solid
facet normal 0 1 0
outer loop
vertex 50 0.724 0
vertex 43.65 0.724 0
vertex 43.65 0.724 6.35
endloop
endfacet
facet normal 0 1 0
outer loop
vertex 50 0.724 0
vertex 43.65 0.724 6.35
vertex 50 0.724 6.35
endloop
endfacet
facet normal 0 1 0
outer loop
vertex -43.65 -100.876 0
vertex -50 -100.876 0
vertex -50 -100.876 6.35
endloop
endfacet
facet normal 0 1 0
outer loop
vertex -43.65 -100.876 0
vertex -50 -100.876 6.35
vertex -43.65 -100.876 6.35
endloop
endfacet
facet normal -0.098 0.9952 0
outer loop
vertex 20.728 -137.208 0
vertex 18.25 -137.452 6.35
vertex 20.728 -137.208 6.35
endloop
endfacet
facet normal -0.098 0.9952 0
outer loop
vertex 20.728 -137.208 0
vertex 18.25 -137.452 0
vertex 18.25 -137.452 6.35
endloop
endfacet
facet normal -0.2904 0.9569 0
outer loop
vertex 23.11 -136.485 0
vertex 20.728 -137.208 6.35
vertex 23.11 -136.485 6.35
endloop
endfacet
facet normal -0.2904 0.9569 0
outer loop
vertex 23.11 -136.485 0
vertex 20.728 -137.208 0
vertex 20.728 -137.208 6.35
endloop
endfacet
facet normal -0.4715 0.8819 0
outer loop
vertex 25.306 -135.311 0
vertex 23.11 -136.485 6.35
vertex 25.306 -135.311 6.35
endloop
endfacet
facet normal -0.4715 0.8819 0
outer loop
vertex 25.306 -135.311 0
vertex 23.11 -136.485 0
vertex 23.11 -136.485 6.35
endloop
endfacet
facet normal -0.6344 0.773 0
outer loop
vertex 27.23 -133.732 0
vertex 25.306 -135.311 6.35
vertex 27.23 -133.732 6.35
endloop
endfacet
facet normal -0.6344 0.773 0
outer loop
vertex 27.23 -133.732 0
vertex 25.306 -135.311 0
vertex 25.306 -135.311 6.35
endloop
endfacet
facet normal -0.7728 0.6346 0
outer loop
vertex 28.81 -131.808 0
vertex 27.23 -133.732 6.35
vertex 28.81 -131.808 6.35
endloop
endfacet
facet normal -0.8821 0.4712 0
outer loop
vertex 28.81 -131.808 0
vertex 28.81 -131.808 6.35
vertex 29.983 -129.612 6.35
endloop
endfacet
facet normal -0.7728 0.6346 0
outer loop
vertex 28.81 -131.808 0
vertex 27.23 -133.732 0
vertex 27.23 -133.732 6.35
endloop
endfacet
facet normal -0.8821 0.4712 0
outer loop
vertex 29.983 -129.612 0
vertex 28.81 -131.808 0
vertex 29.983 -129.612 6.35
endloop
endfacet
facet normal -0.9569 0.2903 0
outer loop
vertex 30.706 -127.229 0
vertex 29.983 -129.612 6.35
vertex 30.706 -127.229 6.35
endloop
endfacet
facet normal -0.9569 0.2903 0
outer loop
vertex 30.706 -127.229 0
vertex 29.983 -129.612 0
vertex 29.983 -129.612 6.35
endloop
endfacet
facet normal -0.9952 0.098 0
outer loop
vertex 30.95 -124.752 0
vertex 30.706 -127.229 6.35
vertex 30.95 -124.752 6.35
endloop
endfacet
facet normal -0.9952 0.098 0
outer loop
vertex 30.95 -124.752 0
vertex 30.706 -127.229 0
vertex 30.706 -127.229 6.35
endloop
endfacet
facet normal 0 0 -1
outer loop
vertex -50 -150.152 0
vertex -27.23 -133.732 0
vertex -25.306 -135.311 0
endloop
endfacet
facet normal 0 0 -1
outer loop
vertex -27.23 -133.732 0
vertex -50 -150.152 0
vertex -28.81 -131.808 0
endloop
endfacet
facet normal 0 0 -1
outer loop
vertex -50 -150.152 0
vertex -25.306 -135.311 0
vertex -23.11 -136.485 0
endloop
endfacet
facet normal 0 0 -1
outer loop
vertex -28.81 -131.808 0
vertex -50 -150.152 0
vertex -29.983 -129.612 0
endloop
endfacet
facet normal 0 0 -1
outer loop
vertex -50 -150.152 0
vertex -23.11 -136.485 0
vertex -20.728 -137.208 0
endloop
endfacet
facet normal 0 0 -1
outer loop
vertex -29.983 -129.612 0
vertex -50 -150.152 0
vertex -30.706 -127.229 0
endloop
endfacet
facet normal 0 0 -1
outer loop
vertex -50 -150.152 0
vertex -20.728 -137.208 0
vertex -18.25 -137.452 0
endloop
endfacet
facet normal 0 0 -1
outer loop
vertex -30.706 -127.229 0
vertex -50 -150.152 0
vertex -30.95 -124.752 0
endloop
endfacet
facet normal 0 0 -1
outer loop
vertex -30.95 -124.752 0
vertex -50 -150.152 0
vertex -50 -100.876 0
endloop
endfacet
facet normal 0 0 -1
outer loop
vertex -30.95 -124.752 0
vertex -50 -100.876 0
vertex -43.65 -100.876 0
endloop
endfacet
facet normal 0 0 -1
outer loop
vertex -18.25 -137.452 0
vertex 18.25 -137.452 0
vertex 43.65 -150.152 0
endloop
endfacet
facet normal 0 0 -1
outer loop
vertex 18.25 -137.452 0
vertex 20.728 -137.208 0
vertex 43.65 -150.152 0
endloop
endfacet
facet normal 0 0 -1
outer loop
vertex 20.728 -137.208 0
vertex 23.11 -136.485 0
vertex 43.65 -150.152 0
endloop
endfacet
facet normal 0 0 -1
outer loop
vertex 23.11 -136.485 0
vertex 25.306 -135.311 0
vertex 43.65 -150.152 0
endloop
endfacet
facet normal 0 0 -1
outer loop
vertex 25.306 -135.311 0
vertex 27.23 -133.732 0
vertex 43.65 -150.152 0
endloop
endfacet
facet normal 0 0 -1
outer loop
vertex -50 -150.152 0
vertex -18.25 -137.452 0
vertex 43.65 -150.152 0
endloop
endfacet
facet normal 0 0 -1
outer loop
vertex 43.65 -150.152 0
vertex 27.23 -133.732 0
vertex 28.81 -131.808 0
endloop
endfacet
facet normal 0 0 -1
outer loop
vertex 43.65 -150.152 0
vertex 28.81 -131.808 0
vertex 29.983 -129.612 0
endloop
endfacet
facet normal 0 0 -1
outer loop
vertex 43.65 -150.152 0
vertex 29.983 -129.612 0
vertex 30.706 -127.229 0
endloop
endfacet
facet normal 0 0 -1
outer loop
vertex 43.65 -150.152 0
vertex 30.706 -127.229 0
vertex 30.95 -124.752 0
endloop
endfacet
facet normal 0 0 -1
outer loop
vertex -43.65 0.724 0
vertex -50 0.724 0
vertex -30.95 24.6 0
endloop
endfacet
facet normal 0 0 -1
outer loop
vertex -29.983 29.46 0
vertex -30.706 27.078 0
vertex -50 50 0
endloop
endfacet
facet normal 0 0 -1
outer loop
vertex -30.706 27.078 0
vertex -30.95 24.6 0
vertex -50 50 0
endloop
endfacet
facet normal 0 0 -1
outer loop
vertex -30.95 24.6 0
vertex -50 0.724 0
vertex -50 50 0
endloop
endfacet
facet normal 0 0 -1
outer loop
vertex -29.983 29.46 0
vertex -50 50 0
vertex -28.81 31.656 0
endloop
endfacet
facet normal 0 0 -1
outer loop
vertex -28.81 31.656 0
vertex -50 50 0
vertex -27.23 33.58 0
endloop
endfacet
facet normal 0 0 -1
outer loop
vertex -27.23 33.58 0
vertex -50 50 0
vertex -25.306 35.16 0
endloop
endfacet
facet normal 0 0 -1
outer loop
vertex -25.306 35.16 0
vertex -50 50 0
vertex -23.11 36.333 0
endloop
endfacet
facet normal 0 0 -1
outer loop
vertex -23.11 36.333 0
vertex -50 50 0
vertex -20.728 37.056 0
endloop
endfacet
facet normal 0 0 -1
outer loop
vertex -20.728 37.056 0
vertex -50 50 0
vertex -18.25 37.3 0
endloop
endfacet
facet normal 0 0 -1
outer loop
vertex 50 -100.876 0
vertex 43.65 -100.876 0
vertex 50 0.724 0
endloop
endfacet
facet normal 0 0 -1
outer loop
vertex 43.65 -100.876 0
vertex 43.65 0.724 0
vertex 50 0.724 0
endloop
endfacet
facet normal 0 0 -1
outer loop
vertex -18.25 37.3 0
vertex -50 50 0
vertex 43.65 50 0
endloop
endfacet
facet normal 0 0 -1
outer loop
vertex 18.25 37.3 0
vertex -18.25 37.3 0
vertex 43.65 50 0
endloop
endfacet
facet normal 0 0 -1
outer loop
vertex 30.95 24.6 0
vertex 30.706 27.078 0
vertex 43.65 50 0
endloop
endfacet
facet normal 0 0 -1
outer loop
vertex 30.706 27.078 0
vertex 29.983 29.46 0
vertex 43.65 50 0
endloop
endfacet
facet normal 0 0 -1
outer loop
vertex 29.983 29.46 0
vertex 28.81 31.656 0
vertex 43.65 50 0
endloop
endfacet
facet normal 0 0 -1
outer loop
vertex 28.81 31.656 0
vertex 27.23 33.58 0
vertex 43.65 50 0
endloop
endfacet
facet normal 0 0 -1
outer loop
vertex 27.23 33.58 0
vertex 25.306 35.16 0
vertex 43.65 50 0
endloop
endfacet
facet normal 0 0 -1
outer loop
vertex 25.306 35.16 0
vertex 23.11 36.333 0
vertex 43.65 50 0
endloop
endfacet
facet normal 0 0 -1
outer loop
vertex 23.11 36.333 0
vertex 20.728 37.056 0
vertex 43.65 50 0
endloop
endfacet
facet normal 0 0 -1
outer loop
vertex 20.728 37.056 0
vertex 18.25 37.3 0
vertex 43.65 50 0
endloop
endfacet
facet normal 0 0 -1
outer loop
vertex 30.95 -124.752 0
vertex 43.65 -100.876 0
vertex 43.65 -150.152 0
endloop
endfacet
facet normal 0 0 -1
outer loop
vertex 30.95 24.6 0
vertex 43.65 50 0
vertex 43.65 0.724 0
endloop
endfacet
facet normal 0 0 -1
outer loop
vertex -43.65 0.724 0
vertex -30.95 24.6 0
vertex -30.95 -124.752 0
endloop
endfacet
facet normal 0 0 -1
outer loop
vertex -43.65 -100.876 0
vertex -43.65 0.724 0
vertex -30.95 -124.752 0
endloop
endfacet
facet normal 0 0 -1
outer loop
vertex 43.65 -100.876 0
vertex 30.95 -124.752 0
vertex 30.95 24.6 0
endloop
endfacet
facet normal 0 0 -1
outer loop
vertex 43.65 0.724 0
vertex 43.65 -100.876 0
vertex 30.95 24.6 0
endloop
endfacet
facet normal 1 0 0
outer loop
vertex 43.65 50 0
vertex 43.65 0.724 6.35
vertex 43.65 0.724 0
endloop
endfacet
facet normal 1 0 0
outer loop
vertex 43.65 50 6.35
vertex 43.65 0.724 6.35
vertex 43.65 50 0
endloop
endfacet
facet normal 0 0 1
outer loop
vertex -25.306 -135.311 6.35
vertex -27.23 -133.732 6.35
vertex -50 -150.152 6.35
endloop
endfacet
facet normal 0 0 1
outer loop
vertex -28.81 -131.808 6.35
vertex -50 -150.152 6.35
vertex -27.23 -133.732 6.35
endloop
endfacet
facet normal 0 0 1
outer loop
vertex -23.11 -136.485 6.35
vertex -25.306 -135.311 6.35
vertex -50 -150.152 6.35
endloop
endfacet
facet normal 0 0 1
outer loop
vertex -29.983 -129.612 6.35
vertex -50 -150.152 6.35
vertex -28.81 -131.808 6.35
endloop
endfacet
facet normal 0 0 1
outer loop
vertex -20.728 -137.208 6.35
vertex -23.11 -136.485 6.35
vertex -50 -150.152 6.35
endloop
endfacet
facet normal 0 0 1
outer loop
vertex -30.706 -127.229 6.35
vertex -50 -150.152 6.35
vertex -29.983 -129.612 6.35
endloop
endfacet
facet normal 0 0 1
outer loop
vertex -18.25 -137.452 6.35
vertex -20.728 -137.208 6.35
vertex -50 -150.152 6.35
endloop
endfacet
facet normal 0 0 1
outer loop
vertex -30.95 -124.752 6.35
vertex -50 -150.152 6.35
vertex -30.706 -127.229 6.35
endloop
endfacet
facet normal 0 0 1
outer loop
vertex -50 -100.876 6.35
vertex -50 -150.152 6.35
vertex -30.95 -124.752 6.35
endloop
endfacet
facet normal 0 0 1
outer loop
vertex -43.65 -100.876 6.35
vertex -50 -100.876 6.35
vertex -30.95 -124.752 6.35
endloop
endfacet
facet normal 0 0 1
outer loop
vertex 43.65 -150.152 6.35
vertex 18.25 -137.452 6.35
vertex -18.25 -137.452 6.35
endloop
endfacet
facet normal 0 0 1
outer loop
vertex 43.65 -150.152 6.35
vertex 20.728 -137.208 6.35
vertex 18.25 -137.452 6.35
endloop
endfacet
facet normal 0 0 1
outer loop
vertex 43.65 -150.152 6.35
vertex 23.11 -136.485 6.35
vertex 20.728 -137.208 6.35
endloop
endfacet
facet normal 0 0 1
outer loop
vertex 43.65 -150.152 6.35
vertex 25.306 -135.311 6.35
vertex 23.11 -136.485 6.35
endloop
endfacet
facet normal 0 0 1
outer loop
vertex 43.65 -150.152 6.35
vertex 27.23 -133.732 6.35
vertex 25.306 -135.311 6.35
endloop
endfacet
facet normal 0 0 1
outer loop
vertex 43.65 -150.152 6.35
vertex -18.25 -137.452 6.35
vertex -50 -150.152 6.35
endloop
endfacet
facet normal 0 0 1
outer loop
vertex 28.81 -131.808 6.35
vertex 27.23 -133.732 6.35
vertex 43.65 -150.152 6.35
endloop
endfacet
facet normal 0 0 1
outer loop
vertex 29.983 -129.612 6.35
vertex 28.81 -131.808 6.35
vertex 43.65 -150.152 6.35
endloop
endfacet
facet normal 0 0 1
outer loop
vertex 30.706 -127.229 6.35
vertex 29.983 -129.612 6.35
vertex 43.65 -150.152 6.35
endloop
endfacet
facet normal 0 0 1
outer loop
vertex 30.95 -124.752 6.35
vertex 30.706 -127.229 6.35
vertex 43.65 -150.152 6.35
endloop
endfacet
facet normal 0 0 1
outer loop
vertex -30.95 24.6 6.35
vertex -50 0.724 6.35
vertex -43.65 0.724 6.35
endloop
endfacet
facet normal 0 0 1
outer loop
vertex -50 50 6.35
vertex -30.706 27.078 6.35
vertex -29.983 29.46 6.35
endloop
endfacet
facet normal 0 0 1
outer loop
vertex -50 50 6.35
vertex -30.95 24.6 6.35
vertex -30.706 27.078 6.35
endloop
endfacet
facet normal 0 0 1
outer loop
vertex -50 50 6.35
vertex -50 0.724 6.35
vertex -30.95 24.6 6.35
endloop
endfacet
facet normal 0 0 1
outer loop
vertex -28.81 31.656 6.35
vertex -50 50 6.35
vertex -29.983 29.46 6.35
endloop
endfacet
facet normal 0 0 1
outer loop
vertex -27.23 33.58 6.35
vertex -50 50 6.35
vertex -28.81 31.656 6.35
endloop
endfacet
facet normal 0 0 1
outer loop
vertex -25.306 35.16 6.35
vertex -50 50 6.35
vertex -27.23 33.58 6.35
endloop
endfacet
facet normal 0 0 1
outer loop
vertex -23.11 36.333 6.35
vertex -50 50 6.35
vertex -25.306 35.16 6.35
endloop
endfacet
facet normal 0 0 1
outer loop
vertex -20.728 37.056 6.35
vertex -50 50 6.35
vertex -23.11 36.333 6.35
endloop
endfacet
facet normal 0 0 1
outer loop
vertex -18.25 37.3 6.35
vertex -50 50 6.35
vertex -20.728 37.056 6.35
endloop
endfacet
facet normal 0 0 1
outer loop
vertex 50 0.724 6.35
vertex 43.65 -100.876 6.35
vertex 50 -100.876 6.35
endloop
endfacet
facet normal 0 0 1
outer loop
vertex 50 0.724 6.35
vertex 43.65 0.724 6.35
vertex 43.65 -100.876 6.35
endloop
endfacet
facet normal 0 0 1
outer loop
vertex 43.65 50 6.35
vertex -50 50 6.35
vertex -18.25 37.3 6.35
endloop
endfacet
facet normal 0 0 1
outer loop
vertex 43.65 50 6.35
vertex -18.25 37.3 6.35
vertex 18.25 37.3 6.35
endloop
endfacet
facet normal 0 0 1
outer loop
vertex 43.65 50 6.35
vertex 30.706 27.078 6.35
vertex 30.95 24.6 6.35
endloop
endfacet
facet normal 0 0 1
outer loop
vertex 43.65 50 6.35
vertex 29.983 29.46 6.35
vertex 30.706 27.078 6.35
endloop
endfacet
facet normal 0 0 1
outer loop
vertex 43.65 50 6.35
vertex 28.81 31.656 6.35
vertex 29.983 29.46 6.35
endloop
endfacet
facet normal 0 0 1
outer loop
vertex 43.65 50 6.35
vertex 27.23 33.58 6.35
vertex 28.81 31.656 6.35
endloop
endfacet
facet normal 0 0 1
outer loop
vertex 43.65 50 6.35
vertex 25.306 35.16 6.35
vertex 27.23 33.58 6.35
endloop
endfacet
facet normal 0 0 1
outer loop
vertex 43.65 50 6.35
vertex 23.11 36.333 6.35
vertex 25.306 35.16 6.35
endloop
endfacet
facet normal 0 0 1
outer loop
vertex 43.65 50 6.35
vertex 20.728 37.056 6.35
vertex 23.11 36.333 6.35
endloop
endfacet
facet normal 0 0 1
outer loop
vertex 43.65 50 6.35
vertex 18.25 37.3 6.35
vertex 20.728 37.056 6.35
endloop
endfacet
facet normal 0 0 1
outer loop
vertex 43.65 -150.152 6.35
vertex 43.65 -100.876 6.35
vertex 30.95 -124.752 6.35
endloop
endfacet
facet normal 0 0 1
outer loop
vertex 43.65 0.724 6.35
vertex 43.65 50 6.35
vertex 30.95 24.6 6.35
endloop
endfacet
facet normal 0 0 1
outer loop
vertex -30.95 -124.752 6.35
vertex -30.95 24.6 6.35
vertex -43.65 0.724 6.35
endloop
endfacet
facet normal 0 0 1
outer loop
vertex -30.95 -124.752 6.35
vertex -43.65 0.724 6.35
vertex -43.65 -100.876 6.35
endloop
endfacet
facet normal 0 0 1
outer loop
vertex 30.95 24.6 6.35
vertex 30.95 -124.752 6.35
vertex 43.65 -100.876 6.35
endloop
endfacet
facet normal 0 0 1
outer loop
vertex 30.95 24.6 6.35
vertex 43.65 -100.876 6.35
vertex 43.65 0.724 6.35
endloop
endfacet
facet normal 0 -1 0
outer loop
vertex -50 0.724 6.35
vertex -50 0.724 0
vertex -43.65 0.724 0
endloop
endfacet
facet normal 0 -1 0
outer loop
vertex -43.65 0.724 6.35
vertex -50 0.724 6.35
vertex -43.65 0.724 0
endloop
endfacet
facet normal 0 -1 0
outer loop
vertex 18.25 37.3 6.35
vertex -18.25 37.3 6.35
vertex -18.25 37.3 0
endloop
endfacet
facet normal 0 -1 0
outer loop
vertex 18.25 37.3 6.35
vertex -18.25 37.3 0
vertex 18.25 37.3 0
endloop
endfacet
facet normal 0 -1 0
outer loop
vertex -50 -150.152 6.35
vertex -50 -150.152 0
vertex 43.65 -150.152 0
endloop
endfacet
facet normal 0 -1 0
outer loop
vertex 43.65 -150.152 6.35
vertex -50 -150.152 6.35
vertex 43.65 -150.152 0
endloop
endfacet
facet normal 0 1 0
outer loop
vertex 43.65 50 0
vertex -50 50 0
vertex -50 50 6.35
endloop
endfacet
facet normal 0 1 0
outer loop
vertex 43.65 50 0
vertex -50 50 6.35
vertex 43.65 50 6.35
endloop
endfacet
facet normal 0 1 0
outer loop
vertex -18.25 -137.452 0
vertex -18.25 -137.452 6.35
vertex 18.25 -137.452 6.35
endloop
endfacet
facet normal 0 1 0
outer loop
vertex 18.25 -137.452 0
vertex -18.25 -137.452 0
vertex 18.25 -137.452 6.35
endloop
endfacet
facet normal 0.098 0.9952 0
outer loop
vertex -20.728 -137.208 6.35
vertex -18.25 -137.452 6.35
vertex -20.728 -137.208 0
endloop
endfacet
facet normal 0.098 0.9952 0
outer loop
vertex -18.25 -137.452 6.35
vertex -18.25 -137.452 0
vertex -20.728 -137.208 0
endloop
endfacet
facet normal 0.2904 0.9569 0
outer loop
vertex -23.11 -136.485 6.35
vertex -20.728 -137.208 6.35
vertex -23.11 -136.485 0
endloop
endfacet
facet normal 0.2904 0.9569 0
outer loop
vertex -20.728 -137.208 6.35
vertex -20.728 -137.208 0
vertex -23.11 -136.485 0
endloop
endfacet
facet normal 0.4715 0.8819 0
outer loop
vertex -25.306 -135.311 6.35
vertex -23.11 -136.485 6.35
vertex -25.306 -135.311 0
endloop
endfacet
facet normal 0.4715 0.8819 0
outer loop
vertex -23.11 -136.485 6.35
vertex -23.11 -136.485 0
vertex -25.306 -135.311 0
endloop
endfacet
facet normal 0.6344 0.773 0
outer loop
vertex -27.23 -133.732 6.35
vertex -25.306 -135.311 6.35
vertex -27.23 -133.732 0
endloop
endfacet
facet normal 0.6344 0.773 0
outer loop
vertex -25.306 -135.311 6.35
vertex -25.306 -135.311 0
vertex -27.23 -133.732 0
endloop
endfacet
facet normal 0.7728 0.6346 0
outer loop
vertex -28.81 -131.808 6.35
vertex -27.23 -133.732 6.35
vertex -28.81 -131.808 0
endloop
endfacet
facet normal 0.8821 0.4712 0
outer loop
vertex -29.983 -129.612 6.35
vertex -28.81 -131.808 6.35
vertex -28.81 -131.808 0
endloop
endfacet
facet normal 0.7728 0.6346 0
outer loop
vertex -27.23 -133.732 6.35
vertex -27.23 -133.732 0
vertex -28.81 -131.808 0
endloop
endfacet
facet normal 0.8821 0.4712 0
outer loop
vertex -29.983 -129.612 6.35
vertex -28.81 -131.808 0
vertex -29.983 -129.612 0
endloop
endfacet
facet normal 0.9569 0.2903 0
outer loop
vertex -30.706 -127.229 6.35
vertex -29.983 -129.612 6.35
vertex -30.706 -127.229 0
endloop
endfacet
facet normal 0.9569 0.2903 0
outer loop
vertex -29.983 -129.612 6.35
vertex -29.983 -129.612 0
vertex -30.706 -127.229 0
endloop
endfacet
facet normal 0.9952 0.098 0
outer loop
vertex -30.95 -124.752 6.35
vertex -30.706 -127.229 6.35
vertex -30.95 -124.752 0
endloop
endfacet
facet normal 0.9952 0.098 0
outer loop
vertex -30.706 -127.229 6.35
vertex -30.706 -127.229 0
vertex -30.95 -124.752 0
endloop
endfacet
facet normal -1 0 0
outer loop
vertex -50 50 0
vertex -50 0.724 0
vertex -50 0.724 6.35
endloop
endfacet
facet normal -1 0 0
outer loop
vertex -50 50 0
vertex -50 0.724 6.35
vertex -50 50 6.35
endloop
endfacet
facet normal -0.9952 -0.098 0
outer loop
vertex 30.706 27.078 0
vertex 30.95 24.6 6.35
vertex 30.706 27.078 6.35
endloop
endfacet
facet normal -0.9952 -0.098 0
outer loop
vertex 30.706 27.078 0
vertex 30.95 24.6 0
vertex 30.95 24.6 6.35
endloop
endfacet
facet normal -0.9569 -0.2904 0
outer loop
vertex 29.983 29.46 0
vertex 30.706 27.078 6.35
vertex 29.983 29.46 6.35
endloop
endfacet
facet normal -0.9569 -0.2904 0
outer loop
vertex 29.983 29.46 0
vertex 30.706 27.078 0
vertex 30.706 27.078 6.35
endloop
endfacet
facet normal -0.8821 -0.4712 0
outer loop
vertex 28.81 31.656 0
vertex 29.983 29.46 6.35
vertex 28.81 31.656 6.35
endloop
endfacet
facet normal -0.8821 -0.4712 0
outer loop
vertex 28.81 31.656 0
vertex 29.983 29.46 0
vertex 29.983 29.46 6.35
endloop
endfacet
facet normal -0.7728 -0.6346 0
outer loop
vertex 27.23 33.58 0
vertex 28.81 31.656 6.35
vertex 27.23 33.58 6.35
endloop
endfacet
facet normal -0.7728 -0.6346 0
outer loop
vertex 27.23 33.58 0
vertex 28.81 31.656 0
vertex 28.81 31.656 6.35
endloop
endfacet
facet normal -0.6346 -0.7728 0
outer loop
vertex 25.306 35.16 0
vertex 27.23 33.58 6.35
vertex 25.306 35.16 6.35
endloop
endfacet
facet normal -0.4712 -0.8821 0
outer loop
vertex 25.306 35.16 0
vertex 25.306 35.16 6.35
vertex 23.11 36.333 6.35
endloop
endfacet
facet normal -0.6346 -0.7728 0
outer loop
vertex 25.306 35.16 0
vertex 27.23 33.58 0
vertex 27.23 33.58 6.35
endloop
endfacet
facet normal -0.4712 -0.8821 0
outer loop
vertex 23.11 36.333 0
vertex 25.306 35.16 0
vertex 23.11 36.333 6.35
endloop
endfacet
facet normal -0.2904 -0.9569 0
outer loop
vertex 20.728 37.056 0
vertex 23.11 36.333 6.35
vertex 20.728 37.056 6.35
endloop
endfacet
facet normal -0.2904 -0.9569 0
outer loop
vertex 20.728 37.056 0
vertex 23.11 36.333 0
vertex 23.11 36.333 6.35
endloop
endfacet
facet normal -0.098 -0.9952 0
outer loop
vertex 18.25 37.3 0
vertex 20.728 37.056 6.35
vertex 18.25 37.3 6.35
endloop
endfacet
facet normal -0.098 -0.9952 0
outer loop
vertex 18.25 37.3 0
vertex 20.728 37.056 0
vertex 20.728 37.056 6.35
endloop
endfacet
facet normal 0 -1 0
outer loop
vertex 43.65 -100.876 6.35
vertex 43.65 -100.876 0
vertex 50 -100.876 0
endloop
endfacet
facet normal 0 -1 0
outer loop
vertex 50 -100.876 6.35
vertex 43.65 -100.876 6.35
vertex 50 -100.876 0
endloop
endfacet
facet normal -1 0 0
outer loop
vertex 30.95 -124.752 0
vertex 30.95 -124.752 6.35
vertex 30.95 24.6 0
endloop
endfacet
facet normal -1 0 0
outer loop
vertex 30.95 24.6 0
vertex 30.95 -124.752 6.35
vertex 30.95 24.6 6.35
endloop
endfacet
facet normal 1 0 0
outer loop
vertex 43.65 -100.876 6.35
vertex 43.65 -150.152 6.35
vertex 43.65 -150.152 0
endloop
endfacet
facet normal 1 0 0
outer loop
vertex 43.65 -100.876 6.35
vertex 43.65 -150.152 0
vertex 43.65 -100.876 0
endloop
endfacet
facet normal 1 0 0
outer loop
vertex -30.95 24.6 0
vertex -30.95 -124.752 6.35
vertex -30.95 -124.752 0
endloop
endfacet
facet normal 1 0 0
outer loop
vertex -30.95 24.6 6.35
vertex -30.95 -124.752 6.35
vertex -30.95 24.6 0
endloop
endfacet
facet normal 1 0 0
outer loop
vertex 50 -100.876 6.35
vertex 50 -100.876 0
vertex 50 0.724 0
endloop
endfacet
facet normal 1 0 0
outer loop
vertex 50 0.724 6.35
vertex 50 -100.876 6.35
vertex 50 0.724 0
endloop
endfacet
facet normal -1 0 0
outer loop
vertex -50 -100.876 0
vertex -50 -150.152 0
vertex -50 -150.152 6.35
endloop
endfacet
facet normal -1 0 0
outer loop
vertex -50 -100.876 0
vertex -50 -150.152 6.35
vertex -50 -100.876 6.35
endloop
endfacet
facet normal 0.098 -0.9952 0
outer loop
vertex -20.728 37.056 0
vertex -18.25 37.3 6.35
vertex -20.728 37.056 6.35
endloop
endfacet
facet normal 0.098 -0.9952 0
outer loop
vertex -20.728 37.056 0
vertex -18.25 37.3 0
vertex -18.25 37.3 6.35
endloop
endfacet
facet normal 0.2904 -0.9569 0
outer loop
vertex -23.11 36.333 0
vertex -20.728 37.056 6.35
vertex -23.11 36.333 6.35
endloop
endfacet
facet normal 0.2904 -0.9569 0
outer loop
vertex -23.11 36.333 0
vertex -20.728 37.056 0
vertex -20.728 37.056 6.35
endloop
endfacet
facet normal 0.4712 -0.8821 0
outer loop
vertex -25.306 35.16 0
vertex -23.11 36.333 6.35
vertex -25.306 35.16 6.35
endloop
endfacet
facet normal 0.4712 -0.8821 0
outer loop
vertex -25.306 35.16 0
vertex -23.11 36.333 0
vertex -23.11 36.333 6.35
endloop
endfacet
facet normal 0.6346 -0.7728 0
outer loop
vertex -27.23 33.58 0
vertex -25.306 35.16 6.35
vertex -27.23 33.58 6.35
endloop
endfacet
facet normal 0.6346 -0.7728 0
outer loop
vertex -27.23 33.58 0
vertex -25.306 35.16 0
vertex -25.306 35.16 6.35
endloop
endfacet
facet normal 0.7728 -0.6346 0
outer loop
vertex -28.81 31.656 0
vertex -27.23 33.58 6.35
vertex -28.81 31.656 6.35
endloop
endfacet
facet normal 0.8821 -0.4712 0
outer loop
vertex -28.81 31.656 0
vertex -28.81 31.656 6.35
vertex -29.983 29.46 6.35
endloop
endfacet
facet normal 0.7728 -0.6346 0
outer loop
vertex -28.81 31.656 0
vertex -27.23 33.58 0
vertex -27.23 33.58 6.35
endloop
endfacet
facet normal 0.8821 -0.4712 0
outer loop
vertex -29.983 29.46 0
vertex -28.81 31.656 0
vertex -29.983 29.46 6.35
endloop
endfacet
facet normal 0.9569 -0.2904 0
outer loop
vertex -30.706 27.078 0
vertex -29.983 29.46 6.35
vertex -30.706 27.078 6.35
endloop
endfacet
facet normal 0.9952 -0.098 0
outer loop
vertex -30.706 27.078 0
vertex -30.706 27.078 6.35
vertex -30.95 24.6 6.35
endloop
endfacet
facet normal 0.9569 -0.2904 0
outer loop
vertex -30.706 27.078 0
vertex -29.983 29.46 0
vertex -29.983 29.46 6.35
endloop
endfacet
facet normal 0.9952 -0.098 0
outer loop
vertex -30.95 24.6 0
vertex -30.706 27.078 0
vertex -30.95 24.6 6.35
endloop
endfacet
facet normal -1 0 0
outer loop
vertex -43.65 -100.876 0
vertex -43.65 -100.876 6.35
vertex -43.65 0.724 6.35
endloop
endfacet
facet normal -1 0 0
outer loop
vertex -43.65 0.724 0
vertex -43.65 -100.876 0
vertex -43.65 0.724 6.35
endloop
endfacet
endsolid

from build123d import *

# Parameters (mm, degrees)
SKETCH1_W           = 100
SKETCH1_H           = 200.1518
BOSS_EXTRUDE1_DEPTH = 6.35
SKETCH2_W           = 6.35
SKETCH2_H           = 50.8
SKETCH2_H_2         = 49.2759
CUT_EXTRUDE1_DEPTH  = 6.35
SKETCH3_W           = 61.9
SKETCH3_H           = 174.7518
CUT_EXTRUDE2_DEPTH  = 6.35
FILLET1_R           = 12.7


with BuildPart() as part:
    # Sketch1 → Boss-Extrude1 (new body)
    with BuildSketch(Plane.XY):
        with Locations((0, -50.0759)):
            Rectangle(SKETCH1_W, SKETCH1_H)
    extrude(amount=BOSS_EXTRUDE1_DEPTH)

    # Sketch2 → Cut-Extrude1 (cut)
    with BuildSketch(Plane.XY.offset(6.35)):
        with Locations((-46.825, -24.6759)):
            Rectangle(SKETCH2_W, SKETCH2_H)
        with Locations((-46.825, -75.4759)):
            Rectangle(SKETCH2_W, SKETCH2_H)
        with Locations((46.825, 25.36205)):
            Rectangle(SKETCH2_W, SKETCH2_H_2)
        with Locations((46.825, -125.51385)):
            Rectangle(SKETCH2_W, SKETCH2_H_2)
    extrude(amount=-CUT_EXTRUDE1_DEPTH, mode=Mode.SUBTRACT)

    # Sketch3 → Cut-Extrude2 (cut)
    with BuildSketch(Plane.XY.offset(6.35)):
        with Locations((0, -50.0759)):
            Rectangle(SKETCH3_W, SKETCH3_H)
    extrude(amount=-CUT_EXTRUDE2_DEPTH, mode=Mode.SUBTRACT)

    # Fillet1
    fillet1_edges = [part.edges().sort_by_distance(p)[0] for p in [
        (-30.95, -137.4518, 3.175),
        (-30.95, 37.3, 3.175),
        (30.95, 37.3, 3.175),
        (30.95, -137.4518, 3.175),
    ]]
    fillet(fillet1_edges, radius=FILLET1_R)


solid = part.part
